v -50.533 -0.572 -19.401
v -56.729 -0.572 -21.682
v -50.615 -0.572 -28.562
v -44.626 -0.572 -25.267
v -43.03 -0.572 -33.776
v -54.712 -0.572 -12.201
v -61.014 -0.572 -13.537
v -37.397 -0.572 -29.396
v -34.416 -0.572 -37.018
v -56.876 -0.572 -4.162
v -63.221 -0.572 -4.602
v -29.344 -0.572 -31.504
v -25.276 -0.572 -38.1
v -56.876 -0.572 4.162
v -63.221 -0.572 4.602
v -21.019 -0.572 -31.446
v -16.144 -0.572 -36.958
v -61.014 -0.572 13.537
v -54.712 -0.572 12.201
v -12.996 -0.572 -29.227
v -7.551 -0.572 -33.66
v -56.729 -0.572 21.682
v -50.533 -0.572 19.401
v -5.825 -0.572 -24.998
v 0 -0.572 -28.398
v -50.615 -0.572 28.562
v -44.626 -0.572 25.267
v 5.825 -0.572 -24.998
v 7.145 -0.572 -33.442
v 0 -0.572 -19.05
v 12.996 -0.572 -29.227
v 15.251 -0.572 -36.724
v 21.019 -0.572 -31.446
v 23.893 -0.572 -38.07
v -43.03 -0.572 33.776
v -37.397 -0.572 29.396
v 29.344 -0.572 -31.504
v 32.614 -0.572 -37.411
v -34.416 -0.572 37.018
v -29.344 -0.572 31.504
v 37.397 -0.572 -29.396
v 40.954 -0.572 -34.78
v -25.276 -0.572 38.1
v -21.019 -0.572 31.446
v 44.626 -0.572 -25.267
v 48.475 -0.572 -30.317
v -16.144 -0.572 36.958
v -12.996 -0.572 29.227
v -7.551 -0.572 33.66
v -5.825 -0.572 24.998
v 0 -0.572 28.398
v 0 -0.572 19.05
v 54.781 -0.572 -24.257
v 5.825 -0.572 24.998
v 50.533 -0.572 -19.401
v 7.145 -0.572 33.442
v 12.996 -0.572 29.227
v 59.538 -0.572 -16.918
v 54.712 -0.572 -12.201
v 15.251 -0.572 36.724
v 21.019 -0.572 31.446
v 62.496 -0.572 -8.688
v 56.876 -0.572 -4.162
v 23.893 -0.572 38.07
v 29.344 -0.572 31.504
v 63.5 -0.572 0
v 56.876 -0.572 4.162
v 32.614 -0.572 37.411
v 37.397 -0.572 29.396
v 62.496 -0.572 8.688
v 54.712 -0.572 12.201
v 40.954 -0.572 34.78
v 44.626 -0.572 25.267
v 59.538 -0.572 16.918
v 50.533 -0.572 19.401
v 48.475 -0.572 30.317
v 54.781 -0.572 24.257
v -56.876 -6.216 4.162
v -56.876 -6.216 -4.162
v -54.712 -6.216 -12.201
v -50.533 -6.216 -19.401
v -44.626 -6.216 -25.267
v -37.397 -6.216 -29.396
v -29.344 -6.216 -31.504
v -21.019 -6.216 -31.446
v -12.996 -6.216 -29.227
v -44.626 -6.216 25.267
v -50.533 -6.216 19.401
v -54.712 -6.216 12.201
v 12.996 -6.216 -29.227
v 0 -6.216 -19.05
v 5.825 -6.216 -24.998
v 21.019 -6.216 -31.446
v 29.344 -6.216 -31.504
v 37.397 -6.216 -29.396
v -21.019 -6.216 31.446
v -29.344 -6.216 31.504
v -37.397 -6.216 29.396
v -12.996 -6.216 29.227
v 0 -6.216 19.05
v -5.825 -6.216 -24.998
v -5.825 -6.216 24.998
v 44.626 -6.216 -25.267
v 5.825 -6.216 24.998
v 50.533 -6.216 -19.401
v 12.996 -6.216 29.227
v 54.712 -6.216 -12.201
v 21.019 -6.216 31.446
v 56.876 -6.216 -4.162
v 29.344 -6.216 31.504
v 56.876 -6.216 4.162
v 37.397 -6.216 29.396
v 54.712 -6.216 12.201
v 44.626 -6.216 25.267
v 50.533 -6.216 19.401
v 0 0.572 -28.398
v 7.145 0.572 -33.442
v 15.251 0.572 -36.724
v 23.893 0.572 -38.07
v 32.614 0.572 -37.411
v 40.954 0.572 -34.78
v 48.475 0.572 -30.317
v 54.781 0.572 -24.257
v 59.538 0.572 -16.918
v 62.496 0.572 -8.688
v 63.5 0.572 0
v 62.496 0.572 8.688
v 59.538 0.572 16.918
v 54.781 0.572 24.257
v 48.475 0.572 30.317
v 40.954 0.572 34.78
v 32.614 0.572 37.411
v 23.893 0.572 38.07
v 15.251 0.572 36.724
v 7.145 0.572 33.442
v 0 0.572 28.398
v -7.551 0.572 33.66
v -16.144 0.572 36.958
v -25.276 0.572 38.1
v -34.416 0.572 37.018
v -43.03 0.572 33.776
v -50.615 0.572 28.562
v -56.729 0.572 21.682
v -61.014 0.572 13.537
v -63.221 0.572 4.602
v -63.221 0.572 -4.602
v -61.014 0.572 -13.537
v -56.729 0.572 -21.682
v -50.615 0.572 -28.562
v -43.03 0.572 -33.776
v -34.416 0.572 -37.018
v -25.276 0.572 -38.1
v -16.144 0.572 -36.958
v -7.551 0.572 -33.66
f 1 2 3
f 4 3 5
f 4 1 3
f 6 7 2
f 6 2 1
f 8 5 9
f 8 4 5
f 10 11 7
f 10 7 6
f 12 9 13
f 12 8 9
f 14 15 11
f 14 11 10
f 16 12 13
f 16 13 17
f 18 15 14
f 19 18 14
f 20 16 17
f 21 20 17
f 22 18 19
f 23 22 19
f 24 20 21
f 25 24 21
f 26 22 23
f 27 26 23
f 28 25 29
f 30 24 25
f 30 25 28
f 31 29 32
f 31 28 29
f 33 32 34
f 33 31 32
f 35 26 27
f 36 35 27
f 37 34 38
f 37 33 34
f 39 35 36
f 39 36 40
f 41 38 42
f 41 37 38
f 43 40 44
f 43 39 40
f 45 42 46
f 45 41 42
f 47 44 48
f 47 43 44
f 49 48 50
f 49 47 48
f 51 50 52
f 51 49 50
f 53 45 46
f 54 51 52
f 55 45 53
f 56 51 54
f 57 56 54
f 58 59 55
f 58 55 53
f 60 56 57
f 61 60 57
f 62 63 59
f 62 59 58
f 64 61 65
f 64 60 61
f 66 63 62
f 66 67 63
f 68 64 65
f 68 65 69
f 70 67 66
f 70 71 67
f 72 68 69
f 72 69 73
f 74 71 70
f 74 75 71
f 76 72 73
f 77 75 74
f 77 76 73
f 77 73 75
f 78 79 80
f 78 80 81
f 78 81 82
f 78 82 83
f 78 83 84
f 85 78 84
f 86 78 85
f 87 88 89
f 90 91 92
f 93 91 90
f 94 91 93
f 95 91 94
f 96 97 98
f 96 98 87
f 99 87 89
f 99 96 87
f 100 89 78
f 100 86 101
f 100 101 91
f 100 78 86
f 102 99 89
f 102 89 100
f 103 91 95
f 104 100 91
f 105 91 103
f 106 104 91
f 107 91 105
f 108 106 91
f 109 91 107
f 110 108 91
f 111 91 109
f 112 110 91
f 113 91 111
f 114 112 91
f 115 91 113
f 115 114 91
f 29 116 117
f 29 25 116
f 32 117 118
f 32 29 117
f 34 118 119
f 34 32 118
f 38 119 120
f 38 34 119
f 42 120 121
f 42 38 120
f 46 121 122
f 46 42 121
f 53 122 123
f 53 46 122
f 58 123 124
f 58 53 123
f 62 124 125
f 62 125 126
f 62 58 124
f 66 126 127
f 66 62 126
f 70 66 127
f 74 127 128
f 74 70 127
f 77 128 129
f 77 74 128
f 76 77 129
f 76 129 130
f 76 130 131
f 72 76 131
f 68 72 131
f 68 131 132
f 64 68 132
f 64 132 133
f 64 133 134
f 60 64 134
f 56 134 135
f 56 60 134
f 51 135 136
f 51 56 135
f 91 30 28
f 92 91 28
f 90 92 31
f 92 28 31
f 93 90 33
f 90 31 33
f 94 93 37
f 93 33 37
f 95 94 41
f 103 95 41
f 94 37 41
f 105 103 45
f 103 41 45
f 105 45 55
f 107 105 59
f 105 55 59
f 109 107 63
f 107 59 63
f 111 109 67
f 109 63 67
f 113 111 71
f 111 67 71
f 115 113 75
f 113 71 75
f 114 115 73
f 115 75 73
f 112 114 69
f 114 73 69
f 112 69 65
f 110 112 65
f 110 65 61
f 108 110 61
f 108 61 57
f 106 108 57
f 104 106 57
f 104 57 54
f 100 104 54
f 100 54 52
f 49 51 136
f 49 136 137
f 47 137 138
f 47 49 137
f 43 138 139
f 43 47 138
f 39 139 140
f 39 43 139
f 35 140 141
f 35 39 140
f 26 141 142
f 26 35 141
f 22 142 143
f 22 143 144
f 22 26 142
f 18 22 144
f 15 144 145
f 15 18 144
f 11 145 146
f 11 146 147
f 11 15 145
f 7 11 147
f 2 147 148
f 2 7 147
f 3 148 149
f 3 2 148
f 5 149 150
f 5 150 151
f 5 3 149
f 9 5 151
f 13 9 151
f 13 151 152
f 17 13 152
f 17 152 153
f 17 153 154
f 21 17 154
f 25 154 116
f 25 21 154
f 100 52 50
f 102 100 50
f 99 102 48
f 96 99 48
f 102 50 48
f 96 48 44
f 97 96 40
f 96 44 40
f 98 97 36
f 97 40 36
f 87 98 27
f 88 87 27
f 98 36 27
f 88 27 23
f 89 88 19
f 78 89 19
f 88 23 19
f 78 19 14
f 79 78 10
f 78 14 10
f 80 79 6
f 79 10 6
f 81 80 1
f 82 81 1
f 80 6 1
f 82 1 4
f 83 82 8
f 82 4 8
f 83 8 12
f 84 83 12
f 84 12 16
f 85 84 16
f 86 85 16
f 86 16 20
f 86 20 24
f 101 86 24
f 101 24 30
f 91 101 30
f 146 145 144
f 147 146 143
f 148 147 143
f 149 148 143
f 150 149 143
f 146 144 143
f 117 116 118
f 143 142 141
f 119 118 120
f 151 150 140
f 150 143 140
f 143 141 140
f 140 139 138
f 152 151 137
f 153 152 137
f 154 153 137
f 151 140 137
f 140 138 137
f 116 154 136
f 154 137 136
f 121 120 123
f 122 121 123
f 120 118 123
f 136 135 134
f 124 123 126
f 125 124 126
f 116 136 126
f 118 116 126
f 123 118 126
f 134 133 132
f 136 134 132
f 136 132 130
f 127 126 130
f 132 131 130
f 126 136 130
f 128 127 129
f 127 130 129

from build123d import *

# Parameters (mm, degrees)
F1_DEPTH = 0.5715
F2_DEPTH = 0.5715
F4_DEPTH = 5.6444444445


with BuildPart() as f1:
    # F0 (on Front) → F1 (new body)
    with BuildSketch(Plane.XZ):
        with BuildLine():
            ThreePointArc((12.7, 0), (9.3803824016, 15.5542598667), (0, 28.3980633142))
            Line((0, 28.3980633142), (0, -28.3980633142))
            ThreePointArc((0, -28.3980633142), (9.3803824016, -15.5542598667), (12.7, 0))
        make_face()
        with BuildLine():
            Line((0, -28.3980633142), (0, 28.3980633142))
            ThreePointArc((0, 28.3980633142), (-12.7, 0), (0, -28.3980633142))
        make_face()
        with BuildLine():
            ThreePointArc((63.5, 0), (40.9542598667, 34.7803824016), (0, 28.3980633142))
            ThreePointArc((0, 28.3980633142), (9.3803824016, 15.5542598667), (12.7, 0))
            ThreePointArc((12.7, 0), (9.3803824016, -15.5542598667), (0, -28.3980633142))
            ThreePointArc((0, -28.3980633142), (40.9542598667, -34.7803824016), (63.5, 0))
        make_face()
        with BuildLine():
            ThreePointArc((0, -28.3980633142), (-12.7, 0), (0, 28.3980633142))
            ThreePointArc((0, 28.3980633142), (-63.5, 0), (0, -28.3980633142))
        make_face()
    extrude(amount=F1_DEPTH)

    # F2 (add): a face of the model
    f2_faces = [f1.faces().sort_by_distance(p)[0] for p in [
        (0, 0, 0),
    ]]
    extrude(f2_faces, amount=F2_DEPTH)

    # F3 (on face) → F4 (join)
    with BuildSketch(Plane.XZ.offset(0.5715)):
        with BuildLine():
            ThreePointArc((0, -19.05), (4.7206947131, -10.040231571), (6.35, 0))
            ThreePointArc((6.35, 0), (4.7206947131, 10.040231571), (0, 19.05))
            ThreePointArc((0, 19.05), (-6.35, 0), (0, -19.05))
        make_face()
        with BuildLine():
            ThreePointArc((0, 19.05), (4.7206947131, 10.040231571), (6.35, 0))
            ThreePointArc((6.35, 0), (4.7206947131, -10.040231571), (0, -19.05))
            ThreePointArc((0, -19.05), (35.440231571, -30.1206947131), (57.15, 0))
            ThreePointArc((57.15, 0), (35.440231571, 30.1206947131), (0, 19.05))
        make_face()
        with BuildLine():
            ThreePointArc((0, -19.05), (-6.35, 0), (0, 19.05))
            ThreePointArc((0, 19.05), (-57.15, 0), (0, -19.05))
        make_face()
    extrude(amount=F4_DEPTH)


solid = f1.part
